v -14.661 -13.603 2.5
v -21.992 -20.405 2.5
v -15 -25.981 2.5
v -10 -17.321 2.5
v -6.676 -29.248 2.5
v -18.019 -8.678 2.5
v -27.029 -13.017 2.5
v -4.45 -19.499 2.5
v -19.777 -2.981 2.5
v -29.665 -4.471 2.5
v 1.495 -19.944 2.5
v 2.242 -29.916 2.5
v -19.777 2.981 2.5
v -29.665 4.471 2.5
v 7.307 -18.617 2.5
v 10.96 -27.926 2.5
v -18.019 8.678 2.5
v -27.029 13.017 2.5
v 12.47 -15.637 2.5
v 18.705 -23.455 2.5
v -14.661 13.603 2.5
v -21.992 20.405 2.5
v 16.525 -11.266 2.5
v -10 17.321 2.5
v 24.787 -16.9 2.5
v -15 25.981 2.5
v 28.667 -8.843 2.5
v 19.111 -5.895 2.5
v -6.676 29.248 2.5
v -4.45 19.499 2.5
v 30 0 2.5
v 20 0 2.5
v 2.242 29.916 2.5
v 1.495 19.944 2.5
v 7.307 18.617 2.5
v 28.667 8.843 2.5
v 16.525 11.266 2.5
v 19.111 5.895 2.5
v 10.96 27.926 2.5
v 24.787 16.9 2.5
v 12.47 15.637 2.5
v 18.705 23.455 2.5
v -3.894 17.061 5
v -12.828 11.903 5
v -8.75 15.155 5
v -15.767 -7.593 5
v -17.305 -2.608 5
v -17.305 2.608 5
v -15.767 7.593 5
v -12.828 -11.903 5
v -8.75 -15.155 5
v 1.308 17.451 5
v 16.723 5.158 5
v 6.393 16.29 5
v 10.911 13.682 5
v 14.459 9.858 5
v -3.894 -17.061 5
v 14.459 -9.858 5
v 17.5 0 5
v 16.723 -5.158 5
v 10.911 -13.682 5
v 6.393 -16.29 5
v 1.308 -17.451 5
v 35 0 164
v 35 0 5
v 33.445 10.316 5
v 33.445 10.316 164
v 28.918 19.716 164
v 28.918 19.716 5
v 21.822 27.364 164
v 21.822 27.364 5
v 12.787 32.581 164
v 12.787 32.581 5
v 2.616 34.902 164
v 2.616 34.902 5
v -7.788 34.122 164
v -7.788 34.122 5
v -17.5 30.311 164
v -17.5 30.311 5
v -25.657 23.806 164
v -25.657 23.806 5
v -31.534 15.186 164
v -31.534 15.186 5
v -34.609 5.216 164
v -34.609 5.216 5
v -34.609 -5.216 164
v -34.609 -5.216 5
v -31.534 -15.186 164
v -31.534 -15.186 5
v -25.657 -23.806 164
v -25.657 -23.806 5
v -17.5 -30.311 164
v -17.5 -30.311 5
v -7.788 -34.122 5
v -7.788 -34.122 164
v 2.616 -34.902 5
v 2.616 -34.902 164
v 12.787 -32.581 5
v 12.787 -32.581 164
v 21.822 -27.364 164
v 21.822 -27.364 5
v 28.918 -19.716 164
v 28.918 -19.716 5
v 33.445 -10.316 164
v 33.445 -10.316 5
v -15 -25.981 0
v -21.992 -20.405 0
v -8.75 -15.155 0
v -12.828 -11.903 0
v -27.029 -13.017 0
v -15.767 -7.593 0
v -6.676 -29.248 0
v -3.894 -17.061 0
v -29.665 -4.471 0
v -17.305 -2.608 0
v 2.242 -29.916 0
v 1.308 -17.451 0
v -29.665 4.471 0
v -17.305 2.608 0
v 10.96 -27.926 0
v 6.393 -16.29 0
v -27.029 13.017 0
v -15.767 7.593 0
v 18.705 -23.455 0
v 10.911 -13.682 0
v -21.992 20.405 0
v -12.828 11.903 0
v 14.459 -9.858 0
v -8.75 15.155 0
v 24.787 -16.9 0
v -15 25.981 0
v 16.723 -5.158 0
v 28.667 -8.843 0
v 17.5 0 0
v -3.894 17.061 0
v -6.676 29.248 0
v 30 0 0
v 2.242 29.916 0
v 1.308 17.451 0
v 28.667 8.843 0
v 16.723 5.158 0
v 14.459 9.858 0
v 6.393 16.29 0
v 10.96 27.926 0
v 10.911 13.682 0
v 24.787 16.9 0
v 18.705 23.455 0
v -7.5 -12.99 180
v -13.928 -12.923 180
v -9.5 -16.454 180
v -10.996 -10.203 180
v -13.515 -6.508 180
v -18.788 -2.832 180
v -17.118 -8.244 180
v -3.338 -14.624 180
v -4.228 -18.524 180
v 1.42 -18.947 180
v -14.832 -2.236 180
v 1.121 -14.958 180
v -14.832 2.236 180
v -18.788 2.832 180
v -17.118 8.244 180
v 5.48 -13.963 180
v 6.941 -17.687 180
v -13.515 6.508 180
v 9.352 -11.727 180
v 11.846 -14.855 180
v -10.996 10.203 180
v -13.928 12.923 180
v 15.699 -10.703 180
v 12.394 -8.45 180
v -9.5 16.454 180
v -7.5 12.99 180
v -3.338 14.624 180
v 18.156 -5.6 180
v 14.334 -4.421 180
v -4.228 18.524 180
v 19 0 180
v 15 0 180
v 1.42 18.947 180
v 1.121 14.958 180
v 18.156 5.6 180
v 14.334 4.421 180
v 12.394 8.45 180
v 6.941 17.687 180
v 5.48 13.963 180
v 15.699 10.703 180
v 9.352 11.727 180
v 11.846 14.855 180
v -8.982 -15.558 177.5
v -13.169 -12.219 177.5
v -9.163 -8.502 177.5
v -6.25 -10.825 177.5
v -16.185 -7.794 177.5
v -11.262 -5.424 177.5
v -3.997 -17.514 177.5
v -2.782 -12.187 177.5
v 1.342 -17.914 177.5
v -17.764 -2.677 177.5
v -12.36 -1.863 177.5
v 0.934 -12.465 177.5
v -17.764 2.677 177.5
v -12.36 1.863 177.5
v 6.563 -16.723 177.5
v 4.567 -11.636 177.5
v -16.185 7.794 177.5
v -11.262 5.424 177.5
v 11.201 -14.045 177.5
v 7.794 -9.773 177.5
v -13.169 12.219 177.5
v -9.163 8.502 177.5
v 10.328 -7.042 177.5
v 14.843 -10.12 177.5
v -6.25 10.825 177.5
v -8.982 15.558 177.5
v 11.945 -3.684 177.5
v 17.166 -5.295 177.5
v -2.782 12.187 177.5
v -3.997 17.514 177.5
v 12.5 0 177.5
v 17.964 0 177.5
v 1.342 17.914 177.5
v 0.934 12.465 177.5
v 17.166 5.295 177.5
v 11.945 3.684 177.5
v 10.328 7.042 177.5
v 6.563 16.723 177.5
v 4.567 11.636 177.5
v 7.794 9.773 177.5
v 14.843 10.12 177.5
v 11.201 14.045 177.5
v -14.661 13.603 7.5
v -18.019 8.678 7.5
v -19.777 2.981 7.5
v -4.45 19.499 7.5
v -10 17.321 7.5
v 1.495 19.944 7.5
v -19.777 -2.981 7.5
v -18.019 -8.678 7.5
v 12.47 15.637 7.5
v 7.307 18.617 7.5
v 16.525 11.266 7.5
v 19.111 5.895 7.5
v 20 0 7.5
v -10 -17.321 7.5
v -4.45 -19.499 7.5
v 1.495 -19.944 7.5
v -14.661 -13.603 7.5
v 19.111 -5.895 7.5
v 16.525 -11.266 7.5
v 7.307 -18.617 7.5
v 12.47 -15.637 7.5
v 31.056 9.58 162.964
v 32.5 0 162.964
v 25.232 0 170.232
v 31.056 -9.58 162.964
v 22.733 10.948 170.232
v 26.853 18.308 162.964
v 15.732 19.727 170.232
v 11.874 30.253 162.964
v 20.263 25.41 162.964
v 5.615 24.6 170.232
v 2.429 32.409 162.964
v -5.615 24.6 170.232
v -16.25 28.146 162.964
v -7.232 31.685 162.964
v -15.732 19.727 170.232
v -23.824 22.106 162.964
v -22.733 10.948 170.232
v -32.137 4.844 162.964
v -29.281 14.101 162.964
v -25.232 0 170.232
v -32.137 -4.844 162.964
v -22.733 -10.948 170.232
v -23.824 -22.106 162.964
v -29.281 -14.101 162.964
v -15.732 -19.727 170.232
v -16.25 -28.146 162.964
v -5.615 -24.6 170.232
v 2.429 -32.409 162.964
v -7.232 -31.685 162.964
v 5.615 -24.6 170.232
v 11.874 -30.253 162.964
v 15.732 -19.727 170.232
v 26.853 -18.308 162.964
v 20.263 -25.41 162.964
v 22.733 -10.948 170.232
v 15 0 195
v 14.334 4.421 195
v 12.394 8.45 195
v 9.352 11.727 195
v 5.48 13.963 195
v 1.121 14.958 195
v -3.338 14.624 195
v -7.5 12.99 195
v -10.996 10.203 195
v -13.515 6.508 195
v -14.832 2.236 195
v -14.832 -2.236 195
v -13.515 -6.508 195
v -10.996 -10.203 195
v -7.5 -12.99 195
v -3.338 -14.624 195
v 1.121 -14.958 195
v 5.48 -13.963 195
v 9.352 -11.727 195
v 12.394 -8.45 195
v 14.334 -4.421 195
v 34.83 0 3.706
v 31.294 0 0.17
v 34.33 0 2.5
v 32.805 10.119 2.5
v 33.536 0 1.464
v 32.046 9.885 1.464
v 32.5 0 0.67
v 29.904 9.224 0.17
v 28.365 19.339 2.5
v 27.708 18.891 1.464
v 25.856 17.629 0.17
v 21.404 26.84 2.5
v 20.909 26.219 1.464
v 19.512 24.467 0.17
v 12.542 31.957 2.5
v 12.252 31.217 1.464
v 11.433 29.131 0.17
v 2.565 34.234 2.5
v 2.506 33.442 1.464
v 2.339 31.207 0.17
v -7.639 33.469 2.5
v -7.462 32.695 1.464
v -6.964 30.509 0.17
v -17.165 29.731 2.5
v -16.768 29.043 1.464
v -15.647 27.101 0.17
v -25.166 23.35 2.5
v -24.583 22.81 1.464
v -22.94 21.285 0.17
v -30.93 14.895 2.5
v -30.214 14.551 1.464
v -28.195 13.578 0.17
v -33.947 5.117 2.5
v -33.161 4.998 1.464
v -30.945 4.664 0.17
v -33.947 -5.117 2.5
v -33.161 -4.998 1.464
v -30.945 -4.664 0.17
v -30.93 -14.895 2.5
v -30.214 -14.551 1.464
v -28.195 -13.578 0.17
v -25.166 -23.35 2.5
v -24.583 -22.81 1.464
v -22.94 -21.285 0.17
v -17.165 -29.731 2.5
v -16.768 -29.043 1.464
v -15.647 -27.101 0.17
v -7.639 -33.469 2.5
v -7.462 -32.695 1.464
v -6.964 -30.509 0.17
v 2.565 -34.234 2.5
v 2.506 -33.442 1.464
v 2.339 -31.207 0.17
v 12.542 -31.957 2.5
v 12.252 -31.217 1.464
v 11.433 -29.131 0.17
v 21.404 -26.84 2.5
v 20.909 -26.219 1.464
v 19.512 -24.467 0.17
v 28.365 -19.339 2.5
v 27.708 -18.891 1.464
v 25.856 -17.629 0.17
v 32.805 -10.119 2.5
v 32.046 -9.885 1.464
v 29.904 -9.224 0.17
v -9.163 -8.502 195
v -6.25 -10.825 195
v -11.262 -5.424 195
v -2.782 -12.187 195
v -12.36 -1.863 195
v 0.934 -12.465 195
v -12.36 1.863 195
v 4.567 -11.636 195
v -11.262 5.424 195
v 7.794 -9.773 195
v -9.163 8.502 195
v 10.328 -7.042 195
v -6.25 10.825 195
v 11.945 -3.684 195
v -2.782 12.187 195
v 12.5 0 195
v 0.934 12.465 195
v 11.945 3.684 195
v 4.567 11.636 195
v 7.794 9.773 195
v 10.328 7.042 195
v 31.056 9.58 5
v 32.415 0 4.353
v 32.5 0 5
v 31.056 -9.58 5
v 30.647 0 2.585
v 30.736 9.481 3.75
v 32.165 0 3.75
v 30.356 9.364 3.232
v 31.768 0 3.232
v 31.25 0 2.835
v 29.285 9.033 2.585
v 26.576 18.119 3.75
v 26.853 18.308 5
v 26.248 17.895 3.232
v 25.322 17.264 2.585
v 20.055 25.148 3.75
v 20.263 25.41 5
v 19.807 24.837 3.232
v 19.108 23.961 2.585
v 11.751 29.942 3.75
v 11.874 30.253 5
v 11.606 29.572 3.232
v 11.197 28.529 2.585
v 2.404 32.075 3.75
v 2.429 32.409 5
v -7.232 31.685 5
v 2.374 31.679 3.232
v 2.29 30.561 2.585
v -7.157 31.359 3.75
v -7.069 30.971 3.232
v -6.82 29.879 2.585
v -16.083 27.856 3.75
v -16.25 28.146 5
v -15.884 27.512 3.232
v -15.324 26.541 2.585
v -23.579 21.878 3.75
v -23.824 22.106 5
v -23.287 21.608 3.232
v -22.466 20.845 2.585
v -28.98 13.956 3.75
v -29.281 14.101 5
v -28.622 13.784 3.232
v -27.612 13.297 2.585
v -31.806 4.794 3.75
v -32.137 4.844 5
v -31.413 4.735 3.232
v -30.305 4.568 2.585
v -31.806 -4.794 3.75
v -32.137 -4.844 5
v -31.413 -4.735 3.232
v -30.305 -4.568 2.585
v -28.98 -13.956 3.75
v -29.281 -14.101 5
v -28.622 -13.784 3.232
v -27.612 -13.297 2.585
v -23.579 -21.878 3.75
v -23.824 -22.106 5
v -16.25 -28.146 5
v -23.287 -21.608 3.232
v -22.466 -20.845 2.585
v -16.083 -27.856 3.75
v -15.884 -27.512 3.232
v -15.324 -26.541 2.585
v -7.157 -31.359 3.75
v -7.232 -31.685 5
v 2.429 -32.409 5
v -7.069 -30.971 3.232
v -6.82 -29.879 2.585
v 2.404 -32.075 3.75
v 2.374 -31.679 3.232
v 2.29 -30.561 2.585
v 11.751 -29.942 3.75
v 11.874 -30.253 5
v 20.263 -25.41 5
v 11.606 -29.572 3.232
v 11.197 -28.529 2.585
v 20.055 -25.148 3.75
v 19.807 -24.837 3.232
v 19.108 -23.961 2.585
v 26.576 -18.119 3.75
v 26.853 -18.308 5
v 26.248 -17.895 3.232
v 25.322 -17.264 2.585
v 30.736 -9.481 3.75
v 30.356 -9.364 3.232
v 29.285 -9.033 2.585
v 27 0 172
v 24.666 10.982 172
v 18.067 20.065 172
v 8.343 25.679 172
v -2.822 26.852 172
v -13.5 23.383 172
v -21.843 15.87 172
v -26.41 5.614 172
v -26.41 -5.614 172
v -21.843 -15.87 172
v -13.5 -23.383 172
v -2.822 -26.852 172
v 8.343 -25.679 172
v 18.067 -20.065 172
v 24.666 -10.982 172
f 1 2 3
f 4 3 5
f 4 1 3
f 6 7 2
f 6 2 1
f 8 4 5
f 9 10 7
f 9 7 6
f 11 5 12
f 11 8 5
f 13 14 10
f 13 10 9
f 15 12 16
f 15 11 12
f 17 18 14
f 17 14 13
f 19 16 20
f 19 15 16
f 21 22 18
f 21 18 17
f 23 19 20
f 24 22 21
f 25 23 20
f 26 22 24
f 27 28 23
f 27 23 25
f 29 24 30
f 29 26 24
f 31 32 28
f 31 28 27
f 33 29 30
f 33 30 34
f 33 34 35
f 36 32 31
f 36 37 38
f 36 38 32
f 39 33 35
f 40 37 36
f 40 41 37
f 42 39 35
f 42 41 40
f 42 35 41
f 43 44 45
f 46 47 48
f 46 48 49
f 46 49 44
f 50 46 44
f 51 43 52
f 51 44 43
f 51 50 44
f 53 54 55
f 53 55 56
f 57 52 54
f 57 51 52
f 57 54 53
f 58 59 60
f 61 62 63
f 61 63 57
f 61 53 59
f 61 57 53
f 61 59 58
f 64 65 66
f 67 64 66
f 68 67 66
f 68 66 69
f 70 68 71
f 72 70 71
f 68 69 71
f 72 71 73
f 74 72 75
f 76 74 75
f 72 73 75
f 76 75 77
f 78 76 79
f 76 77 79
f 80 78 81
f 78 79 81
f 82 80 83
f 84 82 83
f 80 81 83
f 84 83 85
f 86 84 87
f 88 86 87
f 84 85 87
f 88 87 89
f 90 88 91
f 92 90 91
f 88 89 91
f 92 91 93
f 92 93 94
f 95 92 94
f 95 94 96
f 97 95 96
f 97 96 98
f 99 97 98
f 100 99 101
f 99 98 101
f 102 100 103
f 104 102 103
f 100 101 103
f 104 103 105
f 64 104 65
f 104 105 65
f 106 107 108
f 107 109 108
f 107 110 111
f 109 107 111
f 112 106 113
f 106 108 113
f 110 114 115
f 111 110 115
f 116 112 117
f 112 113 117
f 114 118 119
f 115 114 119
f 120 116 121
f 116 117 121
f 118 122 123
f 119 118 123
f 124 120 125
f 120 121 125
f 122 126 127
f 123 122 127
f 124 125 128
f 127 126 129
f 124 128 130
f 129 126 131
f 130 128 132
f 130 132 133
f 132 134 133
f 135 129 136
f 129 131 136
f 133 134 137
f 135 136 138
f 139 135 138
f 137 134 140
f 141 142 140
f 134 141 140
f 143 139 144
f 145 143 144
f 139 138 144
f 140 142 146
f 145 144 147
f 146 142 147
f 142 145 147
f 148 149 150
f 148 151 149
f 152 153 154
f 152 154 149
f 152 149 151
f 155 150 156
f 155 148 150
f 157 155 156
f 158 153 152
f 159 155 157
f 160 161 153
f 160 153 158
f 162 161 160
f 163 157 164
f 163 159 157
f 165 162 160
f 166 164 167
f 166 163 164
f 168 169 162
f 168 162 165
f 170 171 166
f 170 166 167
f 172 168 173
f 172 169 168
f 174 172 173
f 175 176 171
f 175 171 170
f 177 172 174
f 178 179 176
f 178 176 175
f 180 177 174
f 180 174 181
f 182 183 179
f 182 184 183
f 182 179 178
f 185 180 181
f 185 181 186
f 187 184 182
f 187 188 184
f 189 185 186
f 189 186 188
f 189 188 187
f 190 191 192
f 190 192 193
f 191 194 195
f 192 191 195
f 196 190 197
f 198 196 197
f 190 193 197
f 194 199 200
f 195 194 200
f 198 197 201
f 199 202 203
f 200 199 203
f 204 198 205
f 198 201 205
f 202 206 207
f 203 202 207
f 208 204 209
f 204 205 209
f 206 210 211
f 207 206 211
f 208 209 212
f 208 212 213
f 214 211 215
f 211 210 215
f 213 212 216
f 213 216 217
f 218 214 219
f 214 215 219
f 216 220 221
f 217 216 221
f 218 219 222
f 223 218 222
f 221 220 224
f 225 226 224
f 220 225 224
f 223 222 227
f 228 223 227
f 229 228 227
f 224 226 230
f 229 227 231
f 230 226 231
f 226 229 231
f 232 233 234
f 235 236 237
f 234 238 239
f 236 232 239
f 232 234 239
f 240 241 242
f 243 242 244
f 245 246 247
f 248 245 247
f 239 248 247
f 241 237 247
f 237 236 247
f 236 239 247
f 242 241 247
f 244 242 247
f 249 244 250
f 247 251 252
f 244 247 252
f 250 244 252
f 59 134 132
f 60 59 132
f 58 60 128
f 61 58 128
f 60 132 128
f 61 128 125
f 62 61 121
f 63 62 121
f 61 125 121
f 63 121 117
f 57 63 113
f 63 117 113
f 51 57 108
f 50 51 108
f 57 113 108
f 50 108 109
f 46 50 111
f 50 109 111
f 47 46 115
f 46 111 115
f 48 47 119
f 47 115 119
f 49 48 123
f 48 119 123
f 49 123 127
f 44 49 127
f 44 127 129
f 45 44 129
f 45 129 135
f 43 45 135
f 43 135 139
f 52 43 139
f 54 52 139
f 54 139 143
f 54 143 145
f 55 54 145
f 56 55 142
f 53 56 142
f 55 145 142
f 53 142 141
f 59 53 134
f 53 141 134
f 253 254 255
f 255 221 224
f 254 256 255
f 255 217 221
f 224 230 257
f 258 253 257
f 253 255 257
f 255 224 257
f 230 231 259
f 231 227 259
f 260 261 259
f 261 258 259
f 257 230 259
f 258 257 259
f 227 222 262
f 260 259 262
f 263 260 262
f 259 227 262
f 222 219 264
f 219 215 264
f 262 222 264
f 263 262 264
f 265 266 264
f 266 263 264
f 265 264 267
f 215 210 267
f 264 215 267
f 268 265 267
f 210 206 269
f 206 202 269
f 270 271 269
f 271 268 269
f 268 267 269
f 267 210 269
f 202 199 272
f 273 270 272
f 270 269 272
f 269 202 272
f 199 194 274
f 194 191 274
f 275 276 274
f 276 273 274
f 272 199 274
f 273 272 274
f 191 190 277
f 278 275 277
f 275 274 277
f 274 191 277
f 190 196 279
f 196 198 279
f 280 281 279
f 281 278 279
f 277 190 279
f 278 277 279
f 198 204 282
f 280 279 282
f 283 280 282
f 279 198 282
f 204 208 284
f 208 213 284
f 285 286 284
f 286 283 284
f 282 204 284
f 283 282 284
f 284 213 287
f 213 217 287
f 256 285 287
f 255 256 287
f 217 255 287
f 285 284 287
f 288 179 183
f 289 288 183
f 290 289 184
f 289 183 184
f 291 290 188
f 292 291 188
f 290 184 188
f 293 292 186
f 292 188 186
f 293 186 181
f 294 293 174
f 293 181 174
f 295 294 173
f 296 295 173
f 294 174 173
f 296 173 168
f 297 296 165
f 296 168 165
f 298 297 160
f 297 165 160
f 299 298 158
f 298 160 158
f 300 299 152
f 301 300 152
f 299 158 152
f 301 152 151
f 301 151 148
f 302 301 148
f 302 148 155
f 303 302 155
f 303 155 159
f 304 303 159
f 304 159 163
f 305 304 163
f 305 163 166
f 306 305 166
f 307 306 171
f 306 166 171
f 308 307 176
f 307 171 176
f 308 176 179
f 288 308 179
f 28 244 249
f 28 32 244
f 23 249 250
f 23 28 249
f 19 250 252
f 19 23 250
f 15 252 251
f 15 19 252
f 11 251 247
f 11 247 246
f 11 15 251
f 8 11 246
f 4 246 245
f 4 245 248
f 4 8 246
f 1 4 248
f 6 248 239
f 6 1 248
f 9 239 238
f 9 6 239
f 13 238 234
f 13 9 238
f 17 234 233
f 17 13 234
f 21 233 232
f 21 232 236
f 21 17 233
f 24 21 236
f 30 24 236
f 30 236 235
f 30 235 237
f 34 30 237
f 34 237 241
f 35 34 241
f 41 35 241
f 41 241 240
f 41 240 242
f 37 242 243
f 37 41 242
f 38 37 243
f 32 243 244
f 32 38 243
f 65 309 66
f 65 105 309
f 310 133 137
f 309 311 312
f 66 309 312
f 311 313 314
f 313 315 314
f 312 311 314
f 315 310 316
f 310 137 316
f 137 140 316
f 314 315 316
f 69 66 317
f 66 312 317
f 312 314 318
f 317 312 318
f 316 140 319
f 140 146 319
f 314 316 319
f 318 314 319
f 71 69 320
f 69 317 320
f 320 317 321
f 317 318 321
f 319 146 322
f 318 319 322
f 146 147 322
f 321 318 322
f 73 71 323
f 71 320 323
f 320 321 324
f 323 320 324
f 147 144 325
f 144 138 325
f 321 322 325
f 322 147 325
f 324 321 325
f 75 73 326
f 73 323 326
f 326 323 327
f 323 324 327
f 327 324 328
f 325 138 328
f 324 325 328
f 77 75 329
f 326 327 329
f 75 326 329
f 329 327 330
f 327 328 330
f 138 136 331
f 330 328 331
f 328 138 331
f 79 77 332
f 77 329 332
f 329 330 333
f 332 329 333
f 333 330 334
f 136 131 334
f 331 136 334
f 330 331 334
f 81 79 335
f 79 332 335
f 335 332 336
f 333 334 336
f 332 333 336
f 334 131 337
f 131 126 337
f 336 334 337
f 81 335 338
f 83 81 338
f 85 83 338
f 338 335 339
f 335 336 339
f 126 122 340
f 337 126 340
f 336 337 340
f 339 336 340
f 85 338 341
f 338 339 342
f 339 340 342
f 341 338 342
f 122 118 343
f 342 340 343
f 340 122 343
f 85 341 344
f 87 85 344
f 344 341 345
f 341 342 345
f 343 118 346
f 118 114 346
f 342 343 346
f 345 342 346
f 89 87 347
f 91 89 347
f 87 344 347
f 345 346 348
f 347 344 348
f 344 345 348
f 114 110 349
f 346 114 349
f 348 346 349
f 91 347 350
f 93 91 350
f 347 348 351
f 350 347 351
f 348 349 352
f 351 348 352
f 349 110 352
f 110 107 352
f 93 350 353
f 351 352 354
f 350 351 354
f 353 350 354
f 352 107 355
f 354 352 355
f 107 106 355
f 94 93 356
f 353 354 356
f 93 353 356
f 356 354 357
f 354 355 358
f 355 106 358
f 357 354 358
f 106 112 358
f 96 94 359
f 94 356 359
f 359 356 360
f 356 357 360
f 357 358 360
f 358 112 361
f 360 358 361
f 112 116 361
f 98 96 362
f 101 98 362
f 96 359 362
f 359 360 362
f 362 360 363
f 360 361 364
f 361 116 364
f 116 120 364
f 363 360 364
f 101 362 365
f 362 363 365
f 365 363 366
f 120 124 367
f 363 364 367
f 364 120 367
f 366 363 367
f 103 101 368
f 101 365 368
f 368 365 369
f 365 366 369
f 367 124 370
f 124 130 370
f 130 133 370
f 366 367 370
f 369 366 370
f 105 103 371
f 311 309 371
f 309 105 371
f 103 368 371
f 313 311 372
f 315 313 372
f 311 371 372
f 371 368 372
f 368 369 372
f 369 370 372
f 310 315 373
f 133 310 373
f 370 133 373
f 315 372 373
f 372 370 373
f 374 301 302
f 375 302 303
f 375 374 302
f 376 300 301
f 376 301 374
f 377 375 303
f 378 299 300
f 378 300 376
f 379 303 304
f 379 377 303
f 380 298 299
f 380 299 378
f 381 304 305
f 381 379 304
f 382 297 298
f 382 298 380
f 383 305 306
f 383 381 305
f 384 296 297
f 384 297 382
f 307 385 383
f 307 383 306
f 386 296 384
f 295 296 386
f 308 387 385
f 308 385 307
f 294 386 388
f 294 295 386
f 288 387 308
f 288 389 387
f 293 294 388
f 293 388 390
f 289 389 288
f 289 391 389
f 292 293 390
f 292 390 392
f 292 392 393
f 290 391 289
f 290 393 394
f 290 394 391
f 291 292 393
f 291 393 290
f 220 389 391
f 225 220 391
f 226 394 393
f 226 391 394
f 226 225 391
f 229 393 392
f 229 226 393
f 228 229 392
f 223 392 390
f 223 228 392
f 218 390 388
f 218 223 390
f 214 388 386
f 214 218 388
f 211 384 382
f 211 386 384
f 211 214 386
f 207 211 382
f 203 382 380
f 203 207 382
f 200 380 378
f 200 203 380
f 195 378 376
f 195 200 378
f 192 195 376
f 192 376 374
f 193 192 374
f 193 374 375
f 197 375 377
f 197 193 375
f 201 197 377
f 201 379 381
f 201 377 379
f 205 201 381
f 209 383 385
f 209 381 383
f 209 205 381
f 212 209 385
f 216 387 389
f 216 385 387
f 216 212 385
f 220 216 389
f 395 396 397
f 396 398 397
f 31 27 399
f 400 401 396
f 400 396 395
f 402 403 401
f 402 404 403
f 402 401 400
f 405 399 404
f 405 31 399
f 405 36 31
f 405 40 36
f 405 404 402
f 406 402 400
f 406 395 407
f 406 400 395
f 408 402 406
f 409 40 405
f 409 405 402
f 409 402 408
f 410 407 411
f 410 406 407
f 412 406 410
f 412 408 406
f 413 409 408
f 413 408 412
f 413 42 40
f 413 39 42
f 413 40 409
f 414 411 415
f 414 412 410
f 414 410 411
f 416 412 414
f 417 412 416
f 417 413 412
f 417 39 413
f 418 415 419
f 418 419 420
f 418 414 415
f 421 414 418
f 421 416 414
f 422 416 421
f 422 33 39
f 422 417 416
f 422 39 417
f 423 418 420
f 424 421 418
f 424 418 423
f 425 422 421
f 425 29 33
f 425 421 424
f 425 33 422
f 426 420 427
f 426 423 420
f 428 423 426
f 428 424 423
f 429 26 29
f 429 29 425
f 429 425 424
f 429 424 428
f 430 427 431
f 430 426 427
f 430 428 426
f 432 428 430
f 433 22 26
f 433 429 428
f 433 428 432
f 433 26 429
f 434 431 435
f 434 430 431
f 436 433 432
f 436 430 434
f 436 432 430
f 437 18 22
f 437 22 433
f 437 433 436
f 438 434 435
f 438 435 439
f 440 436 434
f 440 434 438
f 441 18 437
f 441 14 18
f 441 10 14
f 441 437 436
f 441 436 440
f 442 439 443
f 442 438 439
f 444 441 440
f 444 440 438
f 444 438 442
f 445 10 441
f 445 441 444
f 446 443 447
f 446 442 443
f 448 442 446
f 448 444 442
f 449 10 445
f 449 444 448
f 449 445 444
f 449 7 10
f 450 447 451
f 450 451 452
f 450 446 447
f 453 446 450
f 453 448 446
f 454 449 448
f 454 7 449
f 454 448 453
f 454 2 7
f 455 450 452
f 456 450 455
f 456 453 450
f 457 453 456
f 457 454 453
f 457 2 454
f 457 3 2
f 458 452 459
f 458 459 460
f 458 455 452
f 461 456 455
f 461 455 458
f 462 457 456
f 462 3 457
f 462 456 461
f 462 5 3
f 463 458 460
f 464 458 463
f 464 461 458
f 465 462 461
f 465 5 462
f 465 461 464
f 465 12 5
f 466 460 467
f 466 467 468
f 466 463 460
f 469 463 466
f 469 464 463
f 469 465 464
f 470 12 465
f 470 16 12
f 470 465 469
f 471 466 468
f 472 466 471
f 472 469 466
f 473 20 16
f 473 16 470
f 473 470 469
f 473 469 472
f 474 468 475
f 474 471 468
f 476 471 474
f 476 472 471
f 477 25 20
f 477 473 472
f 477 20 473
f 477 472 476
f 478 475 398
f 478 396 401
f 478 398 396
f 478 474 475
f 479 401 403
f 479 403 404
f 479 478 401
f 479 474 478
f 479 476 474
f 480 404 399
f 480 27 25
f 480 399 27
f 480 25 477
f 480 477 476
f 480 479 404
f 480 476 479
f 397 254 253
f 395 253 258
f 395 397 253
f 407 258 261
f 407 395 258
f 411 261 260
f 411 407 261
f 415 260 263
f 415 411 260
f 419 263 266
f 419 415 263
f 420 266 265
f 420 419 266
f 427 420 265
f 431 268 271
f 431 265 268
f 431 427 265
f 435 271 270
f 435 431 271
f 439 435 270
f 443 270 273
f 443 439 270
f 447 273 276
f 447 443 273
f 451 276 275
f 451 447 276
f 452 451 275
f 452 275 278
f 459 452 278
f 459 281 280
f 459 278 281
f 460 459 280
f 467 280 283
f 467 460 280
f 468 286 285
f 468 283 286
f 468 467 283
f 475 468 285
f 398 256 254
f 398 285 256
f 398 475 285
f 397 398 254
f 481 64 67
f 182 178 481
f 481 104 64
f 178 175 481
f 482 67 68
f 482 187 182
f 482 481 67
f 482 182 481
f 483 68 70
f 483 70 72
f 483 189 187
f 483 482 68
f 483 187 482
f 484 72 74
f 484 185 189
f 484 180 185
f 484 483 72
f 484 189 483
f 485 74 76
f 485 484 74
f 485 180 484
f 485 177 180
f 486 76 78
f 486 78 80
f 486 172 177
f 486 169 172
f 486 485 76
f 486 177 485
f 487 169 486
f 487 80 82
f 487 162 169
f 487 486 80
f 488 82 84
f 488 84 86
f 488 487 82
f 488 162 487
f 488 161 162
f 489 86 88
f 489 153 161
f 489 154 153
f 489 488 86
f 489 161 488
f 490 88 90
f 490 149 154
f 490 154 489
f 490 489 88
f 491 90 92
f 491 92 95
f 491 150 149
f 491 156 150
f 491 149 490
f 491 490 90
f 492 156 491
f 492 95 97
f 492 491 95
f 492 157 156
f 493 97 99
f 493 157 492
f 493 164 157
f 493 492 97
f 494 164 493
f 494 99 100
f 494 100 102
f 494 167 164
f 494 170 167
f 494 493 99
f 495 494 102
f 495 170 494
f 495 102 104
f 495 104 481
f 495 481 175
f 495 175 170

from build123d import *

# Parameters (mm, degrees)
F0_R     = 35
F1_DEPTH = 180
F2_R     = 15
F3_DEPTH = 15
F4_R     = 5
F5_SIZE  = 16
F6_R     = 17.5
F7_DEPTH = 5
F8_T     = -2.5


with BuildPart() as f1:
    # F0 (on Top) → F1 (new body)
    with BuildSketch(Plane.XY):
        Circle(F0_R)
    extrude(amount=F1_DEPTH)

    # F2 (on face) → F3 (join)
    with BuildSketch(Plane.XY.offset(180)):
        Circle(F2_R)
    extrude(amount=F3_DEPTH)

    # F4
    f4_edges = [f1.edges().sort_by_distance(p)[0] for p in [
        (-35, 0, 0),
    ]]
    fillet(f4_edges, radius=F4_R)

    # F5
    f5_edges = [f1.edges().sort_by_distance(p)[0] for p in [
        (-35, 0, 180),
    ]]
    chamfer(f5_edges, length=F5_SIZE)

    # F6 (on face) → F7 (cut)
    with BuildSketch(Plane(origin=(0, 0, 0), x_dir=(1, 0, 0), z_dir=(0, 0, -1))):
        Circle(F6_R)
    extrude(amount=-F7_DEPTH, mode=Mode.SUBTRACT)

    # F8
    f8_openings = [f1.faces().sort_by_distance(p)[0] for p in [
        (0, 0, 195),
    ]]
    offset(amount=F8_T, openings=f8_openings, kind=Kind.INTERSECTION)


solid = f1.part
